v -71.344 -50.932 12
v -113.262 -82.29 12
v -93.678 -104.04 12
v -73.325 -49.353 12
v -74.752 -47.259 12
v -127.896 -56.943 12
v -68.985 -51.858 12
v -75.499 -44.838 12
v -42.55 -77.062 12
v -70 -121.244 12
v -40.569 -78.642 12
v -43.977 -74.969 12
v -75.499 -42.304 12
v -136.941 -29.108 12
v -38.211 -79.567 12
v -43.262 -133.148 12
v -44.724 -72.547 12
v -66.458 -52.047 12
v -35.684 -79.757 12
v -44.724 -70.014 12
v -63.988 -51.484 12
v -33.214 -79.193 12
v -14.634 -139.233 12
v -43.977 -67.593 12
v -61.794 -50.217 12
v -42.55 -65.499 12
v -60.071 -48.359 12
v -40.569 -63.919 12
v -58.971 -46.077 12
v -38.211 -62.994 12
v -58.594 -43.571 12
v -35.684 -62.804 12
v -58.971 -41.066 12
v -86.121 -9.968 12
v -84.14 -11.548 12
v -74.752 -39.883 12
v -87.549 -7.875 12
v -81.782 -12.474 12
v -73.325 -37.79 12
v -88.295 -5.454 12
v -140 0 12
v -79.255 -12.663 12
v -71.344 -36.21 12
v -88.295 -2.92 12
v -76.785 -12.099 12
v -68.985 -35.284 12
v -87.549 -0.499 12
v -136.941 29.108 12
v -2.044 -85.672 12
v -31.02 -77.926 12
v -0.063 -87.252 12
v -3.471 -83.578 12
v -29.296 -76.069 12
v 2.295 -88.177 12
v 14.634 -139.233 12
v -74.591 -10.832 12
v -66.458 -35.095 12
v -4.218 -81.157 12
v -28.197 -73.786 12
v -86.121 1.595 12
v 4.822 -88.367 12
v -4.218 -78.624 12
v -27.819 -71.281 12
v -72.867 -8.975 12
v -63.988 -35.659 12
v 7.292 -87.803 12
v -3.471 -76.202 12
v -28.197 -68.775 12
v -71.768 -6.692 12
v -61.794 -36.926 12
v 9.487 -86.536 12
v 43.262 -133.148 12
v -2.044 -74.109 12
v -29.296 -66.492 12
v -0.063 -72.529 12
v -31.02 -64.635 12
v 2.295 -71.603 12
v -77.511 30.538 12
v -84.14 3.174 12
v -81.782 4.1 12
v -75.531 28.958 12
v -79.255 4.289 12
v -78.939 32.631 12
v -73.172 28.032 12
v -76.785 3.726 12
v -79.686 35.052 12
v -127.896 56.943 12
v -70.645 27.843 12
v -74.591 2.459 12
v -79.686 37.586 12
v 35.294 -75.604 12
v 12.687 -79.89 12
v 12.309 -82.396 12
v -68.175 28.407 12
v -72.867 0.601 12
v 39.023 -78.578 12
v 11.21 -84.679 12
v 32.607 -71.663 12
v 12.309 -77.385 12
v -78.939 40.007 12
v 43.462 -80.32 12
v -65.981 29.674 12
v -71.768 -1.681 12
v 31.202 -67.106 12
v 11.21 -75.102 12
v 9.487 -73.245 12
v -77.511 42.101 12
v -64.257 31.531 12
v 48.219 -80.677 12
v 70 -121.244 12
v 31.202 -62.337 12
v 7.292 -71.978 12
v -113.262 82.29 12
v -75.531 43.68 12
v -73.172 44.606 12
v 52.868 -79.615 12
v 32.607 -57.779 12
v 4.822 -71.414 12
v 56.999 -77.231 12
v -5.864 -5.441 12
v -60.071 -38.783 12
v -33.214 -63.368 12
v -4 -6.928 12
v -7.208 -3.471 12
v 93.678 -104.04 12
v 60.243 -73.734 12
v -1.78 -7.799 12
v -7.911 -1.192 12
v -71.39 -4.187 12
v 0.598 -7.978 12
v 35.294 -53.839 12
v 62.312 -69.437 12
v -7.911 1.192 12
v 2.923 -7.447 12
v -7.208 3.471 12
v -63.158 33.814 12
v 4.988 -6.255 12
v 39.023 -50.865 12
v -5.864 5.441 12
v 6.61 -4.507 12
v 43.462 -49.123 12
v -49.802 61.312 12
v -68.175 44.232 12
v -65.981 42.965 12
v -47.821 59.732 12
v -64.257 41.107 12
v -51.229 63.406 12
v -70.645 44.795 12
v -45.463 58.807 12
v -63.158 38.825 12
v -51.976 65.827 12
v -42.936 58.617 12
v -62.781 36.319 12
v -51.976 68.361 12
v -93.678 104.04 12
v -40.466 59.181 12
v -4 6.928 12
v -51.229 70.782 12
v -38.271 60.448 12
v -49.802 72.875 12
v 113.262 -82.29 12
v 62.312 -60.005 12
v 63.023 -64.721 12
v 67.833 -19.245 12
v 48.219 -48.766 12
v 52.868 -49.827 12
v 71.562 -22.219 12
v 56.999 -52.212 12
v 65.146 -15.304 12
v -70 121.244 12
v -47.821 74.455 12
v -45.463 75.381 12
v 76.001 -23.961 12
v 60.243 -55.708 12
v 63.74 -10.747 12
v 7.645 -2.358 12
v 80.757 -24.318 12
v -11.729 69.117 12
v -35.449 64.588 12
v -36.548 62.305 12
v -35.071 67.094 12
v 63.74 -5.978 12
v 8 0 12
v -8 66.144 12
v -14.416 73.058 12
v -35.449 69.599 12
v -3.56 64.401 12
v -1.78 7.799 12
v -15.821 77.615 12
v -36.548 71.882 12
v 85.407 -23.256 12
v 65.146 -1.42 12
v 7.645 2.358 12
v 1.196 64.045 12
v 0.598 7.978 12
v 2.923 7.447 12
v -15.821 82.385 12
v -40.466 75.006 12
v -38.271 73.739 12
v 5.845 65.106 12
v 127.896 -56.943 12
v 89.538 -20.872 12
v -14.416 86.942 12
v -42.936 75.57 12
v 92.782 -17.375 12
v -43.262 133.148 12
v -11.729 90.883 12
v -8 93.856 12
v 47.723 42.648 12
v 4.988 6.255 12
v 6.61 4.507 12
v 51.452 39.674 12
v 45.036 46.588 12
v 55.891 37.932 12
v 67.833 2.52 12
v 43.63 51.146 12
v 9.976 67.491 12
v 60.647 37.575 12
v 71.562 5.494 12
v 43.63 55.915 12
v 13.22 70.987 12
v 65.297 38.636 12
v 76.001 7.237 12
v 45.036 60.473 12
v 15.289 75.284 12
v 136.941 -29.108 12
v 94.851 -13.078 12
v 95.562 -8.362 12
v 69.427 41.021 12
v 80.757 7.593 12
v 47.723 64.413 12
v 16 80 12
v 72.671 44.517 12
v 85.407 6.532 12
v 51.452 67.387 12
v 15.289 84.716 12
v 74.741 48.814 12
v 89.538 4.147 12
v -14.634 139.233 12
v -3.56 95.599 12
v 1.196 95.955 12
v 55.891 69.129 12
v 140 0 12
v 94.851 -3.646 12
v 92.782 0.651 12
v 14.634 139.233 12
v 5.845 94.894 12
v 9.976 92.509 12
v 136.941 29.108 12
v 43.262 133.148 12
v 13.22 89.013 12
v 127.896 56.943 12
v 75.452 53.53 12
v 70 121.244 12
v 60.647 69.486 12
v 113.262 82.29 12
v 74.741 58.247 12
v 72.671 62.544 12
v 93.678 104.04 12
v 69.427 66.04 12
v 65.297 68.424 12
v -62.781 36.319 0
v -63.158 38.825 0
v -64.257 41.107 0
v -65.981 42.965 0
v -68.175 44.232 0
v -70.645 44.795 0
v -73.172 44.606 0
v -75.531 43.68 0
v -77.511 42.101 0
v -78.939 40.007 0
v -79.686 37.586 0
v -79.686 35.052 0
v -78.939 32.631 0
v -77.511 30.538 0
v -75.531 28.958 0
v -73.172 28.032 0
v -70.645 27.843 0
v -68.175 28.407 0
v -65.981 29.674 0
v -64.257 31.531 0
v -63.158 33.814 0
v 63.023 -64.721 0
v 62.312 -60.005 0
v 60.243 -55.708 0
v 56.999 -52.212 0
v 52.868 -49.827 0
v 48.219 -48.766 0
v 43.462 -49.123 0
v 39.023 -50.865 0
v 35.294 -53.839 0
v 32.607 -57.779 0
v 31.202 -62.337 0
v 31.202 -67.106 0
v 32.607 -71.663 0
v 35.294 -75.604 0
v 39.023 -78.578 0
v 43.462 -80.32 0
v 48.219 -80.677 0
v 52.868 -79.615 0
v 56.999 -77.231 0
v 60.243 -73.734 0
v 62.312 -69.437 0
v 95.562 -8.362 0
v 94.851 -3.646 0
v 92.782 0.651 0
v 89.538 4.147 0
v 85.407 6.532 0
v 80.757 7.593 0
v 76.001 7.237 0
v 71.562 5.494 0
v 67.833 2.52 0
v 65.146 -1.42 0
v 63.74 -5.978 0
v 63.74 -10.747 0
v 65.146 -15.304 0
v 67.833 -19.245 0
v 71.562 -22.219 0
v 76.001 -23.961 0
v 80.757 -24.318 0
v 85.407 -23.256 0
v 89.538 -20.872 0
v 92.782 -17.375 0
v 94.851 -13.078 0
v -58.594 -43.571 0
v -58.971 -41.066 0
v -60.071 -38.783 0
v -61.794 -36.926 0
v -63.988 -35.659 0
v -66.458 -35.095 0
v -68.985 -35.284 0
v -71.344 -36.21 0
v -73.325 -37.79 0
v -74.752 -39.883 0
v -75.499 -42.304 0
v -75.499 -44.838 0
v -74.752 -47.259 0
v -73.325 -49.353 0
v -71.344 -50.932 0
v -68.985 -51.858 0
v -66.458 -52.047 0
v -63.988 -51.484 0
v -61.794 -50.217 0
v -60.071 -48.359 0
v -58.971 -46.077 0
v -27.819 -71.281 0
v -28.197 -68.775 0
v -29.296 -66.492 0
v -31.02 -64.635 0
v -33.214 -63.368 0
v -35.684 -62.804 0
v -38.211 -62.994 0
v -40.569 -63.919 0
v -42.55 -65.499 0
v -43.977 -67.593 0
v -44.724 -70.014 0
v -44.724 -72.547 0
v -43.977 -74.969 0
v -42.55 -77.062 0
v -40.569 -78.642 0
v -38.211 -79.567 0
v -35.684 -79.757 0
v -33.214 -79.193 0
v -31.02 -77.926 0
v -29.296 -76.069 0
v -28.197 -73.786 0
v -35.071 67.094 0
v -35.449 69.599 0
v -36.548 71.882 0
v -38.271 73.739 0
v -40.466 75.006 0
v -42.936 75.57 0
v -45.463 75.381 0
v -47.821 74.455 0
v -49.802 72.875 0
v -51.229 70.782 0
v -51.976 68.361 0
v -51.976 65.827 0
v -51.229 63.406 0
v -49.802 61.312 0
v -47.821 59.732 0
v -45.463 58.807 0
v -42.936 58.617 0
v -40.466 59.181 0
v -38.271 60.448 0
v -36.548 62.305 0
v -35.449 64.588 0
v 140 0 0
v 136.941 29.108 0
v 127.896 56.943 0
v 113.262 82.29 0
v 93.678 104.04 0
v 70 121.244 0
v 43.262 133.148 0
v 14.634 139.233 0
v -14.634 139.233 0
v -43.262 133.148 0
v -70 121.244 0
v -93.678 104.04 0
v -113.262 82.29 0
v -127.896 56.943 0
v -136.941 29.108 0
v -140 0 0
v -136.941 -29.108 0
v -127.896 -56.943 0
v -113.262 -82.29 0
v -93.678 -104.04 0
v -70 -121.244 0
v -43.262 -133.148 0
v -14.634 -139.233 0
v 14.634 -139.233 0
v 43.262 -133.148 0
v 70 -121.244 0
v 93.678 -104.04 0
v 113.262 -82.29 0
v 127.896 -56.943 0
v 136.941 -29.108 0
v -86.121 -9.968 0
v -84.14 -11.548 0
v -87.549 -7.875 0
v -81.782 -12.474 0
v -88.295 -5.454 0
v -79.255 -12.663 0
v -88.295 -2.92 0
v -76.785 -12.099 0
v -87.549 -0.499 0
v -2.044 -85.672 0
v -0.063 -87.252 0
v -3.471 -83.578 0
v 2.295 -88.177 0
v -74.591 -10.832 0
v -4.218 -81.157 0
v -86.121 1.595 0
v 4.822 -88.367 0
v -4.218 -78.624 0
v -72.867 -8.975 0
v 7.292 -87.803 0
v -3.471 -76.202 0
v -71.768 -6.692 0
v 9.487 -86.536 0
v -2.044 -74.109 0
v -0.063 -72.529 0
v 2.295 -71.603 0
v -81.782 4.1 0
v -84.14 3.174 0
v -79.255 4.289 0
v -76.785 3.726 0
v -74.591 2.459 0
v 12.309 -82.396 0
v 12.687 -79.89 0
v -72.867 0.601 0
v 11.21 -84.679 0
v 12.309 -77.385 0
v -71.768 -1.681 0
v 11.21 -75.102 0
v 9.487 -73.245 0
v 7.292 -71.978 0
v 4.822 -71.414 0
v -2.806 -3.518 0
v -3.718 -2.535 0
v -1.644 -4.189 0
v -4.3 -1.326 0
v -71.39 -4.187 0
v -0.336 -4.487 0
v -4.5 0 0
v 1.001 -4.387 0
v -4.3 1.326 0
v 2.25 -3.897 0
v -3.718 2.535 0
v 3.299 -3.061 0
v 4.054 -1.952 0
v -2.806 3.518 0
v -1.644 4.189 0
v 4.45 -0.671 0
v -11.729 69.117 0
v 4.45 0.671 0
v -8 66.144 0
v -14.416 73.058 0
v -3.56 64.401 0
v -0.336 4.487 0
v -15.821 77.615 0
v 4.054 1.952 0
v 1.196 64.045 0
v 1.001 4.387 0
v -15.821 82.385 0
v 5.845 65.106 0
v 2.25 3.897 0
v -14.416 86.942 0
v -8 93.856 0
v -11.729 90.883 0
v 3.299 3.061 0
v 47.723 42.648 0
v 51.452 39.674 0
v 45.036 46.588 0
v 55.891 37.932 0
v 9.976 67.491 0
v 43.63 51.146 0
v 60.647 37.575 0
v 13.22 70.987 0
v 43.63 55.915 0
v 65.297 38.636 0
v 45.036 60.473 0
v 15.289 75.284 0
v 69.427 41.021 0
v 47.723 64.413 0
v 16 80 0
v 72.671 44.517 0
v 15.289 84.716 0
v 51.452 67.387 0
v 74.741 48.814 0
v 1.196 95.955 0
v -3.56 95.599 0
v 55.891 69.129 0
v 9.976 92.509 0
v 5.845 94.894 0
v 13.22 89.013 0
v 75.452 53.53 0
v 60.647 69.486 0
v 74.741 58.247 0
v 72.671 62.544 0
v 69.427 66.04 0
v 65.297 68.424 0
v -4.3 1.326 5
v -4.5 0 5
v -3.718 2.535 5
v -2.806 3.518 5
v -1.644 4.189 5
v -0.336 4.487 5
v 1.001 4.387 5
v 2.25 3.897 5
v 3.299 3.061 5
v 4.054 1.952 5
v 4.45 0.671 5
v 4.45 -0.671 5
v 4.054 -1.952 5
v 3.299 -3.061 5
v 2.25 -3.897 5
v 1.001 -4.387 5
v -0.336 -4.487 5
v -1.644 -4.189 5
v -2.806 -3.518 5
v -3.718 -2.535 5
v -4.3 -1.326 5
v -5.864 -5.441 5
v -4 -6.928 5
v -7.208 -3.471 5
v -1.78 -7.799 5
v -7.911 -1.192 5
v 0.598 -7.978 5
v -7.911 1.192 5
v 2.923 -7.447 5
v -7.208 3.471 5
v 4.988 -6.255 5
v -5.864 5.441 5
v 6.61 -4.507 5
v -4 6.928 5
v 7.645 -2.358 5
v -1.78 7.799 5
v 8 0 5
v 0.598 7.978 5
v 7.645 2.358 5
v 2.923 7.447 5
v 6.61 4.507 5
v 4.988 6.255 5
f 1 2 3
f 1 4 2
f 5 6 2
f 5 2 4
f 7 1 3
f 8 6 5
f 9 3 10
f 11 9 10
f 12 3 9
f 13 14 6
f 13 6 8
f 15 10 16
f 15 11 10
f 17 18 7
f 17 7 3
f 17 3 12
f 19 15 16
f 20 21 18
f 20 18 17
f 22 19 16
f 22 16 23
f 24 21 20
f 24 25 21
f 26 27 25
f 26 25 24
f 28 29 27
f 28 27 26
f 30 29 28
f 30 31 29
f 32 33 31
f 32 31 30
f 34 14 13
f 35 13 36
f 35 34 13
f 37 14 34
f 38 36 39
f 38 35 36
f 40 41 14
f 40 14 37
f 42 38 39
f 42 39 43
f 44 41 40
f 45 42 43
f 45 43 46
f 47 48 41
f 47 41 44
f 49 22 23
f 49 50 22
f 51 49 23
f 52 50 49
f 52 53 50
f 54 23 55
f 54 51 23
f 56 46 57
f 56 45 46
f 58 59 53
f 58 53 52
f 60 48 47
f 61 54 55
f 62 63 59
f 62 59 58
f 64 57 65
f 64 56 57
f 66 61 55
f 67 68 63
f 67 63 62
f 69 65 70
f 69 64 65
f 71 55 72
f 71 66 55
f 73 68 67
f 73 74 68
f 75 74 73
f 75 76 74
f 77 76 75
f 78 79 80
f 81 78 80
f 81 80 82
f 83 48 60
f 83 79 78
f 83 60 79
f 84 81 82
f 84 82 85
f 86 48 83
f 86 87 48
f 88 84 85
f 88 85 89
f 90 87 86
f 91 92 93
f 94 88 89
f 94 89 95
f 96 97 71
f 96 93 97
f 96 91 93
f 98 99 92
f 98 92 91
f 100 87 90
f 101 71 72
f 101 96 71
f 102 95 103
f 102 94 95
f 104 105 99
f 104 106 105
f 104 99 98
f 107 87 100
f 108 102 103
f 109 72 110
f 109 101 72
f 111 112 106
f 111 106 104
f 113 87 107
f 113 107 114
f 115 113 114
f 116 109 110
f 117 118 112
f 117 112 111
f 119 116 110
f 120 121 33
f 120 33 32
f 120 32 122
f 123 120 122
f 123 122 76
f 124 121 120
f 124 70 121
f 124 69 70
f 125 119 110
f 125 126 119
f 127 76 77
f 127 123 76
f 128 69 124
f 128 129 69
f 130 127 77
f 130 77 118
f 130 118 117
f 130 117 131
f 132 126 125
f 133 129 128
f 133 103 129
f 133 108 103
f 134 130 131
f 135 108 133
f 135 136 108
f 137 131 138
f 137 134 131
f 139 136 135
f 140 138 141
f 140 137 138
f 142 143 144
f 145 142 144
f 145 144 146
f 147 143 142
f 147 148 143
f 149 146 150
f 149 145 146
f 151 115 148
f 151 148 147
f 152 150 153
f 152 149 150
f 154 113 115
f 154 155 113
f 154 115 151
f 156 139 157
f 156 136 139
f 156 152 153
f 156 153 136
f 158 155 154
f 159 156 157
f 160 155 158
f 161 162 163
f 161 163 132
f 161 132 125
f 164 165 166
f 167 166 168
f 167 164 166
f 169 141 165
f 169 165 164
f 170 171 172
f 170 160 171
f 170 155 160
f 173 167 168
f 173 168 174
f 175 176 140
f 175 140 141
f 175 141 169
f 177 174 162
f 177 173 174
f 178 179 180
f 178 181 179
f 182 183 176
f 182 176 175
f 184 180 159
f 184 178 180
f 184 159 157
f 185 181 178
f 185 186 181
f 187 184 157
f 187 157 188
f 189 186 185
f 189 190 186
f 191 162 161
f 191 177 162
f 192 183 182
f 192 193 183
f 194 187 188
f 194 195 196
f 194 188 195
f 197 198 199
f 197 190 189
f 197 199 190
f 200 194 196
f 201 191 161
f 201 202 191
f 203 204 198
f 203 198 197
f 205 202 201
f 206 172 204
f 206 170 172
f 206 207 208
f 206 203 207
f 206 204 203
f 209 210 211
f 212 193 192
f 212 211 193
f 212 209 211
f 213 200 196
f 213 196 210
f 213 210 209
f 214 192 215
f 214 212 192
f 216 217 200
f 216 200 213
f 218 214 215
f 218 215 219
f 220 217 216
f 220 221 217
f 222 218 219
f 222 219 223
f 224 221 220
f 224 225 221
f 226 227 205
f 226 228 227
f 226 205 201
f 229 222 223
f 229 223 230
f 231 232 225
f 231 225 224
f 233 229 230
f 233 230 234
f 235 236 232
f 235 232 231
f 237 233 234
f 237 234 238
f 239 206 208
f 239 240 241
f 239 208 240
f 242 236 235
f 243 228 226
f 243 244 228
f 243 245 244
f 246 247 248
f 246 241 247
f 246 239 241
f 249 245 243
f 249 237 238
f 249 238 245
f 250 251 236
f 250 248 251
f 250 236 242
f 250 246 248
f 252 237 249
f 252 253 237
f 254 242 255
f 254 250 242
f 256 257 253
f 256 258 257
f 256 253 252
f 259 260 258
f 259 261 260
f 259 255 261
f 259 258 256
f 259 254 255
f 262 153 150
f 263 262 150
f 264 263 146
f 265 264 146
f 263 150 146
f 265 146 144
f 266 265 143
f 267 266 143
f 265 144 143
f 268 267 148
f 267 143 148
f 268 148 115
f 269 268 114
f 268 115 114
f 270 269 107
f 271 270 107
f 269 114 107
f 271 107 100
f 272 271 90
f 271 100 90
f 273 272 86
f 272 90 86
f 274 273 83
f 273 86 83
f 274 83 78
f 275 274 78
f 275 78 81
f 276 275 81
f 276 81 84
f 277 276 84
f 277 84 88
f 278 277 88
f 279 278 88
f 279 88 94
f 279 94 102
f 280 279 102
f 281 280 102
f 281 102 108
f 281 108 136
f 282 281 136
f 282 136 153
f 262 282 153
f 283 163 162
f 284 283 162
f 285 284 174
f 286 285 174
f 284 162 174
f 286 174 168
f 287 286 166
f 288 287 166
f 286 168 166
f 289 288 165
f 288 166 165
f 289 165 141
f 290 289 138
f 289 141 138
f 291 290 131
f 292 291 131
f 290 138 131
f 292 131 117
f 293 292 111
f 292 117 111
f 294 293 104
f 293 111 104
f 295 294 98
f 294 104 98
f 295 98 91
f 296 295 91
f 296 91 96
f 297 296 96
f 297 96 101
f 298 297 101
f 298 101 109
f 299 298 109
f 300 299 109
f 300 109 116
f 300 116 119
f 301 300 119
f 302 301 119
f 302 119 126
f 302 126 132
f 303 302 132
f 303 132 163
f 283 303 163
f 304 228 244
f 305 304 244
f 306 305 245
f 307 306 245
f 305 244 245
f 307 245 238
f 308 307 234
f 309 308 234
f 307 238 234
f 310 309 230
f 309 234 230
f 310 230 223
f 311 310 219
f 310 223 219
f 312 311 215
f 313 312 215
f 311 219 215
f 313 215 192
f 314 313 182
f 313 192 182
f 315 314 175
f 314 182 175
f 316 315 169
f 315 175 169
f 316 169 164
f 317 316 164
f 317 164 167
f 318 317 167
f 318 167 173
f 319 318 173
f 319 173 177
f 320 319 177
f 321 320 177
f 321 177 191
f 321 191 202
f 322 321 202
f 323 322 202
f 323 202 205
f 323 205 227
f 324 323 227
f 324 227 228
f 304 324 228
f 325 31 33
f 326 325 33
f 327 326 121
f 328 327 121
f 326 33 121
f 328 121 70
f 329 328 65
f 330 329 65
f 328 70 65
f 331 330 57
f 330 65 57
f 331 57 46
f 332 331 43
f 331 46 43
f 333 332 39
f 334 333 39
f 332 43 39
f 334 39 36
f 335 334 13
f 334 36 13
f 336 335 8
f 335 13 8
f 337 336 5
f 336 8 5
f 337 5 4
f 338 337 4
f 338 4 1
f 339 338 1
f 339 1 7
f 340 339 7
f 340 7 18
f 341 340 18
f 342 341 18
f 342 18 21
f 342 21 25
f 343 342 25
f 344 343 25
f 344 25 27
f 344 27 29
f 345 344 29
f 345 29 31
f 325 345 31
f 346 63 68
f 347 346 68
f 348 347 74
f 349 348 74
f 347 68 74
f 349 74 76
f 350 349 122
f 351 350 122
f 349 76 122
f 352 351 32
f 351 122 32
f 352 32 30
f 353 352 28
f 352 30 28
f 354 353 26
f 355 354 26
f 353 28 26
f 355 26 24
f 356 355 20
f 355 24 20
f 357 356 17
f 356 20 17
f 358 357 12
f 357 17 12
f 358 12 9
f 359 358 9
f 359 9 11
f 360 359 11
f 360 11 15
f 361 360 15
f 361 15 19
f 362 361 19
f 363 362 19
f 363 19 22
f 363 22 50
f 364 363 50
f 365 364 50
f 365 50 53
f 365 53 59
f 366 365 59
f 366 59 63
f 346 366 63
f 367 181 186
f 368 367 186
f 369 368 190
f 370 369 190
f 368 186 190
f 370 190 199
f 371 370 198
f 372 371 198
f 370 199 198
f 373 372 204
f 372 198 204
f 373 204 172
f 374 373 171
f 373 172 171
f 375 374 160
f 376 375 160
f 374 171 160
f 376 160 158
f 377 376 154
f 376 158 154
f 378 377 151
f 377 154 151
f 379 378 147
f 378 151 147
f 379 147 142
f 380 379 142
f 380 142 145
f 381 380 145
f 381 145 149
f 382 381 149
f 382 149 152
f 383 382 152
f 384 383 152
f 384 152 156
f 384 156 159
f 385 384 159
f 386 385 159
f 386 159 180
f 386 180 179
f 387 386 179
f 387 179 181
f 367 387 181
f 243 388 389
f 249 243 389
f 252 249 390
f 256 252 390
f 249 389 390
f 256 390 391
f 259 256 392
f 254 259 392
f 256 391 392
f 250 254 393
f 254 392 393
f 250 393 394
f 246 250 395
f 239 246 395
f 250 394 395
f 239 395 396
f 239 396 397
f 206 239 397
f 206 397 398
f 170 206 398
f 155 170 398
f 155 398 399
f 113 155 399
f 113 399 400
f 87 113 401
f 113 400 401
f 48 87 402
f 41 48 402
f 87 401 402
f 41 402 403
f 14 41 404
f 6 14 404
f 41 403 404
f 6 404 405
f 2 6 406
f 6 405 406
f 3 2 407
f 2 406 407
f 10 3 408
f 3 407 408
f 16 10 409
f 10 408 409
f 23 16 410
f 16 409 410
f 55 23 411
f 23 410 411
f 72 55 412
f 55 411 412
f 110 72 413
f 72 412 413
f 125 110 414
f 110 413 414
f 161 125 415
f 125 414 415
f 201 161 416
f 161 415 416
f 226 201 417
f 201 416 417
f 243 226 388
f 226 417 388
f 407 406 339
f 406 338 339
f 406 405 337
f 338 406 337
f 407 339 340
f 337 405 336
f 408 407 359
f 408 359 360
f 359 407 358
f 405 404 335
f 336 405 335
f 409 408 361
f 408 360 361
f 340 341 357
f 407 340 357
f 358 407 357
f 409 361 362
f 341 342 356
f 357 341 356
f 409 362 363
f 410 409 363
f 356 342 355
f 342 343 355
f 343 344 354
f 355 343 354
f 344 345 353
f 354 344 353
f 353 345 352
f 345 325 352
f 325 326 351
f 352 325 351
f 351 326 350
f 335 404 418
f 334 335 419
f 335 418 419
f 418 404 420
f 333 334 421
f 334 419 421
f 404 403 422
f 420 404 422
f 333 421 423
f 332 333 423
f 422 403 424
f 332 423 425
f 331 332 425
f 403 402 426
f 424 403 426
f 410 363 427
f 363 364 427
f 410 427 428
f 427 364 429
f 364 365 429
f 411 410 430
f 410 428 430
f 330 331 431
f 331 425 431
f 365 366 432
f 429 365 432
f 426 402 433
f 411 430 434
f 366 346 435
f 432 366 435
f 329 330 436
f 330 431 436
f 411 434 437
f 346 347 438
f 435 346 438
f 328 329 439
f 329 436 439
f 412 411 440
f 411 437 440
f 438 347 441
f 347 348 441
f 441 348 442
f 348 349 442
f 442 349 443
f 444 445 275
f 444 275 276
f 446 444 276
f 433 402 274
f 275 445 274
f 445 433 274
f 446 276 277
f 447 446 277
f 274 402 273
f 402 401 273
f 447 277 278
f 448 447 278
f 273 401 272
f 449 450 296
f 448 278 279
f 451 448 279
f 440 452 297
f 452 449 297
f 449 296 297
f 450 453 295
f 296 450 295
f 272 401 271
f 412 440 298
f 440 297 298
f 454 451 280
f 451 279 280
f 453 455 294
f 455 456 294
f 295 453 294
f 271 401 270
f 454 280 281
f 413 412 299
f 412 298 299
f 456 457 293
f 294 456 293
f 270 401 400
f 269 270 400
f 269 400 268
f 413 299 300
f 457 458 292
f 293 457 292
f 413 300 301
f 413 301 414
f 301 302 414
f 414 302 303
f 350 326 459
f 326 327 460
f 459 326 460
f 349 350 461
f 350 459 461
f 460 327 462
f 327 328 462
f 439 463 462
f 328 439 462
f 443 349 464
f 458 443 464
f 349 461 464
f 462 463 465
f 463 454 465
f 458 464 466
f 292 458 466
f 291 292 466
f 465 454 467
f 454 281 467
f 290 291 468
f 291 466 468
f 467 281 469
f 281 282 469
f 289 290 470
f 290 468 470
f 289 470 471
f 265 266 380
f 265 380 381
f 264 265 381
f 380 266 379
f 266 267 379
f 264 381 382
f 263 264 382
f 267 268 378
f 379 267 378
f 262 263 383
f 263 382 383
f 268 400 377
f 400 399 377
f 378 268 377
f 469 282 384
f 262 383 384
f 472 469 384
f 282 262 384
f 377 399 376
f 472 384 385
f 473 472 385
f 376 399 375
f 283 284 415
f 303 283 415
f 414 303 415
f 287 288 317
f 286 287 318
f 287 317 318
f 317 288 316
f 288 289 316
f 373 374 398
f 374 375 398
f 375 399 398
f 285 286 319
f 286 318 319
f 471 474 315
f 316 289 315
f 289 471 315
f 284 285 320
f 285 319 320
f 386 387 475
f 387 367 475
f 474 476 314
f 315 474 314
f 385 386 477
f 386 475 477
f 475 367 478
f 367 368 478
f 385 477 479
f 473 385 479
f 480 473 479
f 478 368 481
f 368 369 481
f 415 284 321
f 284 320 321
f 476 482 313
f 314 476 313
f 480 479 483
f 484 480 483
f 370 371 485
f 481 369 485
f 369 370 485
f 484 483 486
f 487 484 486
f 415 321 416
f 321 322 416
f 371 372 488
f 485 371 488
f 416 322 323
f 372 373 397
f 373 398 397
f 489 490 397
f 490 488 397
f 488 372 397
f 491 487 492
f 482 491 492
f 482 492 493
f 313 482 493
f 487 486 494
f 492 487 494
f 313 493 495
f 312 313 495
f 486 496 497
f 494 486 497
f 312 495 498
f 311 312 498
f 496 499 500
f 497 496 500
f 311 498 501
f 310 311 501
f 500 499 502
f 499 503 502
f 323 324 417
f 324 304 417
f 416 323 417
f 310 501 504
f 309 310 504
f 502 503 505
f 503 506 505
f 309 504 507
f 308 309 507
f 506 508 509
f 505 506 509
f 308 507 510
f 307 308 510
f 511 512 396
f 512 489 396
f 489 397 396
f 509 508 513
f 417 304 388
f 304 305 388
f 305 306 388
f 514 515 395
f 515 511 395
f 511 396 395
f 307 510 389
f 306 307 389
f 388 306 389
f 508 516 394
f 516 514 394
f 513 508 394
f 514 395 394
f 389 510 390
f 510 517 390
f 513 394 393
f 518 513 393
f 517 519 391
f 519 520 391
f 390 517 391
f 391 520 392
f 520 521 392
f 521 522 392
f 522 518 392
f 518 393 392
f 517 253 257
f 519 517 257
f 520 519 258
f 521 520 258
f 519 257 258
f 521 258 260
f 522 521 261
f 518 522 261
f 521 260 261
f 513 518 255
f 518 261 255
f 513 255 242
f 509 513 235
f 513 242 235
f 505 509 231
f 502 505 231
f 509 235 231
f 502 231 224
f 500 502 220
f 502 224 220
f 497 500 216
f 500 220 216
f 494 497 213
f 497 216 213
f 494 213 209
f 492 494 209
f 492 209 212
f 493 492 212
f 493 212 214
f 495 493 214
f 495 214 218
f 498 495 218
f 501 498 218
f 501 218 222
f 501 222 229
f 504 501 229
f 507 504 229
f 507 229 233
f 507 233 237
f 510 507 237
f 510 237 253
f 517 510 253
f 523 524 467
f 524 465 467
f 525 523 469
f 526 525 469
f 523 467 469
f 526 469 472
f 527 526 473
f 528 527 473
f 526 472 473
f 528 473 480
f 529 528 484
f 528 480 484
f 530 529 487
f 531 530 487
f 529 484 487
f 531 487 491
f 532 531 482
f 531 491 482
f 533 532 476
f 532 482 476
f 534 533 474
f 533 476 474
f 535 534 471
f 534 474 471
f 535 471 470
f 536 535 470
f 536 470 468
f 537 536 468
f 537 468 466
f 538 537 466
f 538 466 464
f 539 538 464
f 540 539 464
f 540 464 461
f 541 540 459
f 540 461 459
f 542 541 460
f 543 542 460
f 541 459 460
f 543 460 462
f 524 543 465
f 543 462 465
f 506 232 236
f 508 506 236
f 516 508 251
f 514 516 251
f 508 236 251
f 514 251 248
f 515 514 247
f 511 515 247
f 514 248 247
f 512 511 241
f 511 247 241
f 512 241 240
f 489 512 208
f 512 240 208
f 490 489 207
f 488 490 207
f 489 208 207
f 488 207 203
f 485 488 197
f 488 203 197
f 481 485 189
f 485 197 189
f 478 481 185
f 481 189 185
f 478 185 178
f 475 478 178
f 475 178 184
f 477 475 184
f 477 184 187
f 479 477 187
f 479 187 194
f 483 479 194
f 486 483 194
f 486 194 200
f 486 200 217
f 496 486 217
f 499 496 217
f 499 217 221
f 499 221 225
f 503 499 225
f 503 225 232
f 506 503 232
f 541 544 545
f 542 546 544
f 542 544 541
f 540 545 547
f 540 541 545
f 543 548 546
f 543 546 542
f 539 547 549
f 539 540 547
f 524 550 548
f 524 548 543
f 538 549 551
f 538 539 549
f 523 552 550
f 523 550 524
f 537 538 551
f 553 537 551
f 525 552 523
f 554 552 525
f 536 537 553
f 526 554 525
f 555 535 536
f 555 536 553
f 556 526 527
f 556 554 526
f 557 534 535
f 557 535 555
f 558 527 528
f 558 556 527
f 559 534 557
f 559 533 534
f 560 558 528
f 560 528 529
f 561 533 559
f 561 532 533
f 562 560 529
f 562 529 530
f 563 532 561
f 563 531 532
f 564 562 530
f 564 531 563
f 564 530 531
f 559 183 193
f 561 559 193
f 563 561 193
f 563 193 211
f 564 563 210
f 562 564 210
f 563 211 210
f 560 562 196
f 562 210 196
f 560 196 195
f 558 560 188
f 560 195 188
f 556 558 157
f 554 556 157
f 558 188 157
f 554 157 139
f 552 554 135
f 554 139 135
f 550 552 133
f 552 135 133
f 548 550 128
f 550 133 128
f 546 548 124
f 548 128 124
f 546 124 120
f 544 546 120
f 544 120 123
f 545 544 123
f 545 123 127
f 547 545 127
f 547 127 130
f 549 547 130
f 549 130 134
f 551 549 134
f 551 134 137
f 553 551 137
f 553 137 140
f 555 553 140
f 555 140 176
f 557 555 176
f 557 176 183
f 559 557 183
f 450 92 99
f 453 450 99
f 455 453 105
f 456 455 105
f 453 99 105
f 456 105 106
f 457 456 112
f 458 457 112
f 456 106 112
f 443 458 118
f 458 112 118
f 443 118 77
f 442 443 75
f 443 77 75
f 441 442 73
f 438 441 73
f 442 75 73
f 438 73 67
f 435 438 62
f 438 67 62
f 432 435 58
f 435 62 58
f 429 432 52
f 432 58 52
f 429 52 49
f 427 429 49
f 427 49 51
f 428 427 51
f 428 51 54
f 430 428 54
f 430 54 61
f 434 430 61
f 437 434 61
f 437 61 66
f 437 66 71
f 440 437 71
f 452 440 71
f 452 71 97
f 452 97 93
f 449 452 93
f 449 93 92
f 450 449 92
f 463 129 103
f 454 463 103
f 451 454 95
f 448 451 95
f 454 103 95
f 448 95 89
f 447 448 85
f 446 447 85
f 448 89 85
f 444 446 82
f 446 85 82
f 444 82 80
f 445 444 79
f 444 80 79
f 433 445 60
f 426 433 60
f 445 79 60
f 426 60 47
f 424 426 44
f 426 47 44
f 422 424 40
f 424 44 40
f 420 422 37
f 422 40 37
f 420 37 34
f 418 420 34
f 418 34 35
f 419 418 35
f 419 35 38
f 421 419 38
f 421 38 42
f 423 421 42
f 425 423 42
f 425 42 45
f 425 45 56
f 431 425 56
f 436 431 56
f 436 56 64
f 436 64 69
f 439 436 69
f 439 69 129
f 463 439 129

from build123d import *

# Parameters (mm, degrees)
SKETCH2_R                               = 140
BOSS_EXTRUDE1_DEPTH                     = 12
SKETCH3_R                               = 16
SKETCH3_R_2                             = 8.5
CUT_EXTRUDE1_DEPTH                      = 13
CBORE_FOR_M5_HEX_HEAD_BOLT1_D           = 9
CBORE_FOR_M5_HEX_HEAD_BOLT1_CBORE_D     = 16
CBORE_FOR_M5_HEX_HEAD_BOLT1_CBORE_DEPTH = 7


with BuildPart() as part:
    # Sketch2 → Boss-Extrude1 (new body)
    with BuildSketch(Plane.XY):
        Circle(SKETCH2_R)
    extrude(amount=BOSS_EXTRUDE1_DEPTH)

    # Sketch3 → Cut-Extrude1 (cut, through all)
    with BuildSketch(Plane.XY.offset(12)):
        with Locations((59.451586038, 53.530448509)):
            Circle(SKETCH3_R)
        with Locations((0, 80)):
            Circle(SKETCH3_R)
        with Locations((79.561751629, -8.362277061)):
            Circle(SKETCH3_R)
        with Locations((47.022820183, -64.72135955)):
            Circle(SKETCH3_R)
        with Locations((4.186876499, -79.89036278)):
            Circle(SKETCH3_R_2)
        with Locations((-36.319239979, -71.280521935)):
            Circle(SKETCH3_R_2)
        with Locations((-67.093645436, -43.571122801)):
            Circle(SKETCH3_R_2)
        with Locations((-79.89036278, -4.186876499)):
            Circle(SKETCH3_R_2)
        with Locations((-71.280521935, 36.319239979)):
            Circle(SKETCH3_R_2)
        with Locations((-43.571122801, 67.093645436)):
            Circle(SKETCH3_R_2)
    extrude(amount=-CUT_EXTRUDE1_DEPTH, mode=Mode.SUBTRACT)

    # CBORE for M5 Hex Head Bolt1 (through all)
    with Locations(Plane.XY.offset(12)):
        with Locations((0, 0)):
            CounterBoreHole(CBORE_FOR_M5_HEX_HEAD_BOLT1_D / 2, CBORE_FOR_M5_HEX_HEAD_BOLT1_CBORE_D / 2, CBORE_FOR_M5_HEX_HEAD_BOLT1_CBORE_DEPTH)


solid = part.part
